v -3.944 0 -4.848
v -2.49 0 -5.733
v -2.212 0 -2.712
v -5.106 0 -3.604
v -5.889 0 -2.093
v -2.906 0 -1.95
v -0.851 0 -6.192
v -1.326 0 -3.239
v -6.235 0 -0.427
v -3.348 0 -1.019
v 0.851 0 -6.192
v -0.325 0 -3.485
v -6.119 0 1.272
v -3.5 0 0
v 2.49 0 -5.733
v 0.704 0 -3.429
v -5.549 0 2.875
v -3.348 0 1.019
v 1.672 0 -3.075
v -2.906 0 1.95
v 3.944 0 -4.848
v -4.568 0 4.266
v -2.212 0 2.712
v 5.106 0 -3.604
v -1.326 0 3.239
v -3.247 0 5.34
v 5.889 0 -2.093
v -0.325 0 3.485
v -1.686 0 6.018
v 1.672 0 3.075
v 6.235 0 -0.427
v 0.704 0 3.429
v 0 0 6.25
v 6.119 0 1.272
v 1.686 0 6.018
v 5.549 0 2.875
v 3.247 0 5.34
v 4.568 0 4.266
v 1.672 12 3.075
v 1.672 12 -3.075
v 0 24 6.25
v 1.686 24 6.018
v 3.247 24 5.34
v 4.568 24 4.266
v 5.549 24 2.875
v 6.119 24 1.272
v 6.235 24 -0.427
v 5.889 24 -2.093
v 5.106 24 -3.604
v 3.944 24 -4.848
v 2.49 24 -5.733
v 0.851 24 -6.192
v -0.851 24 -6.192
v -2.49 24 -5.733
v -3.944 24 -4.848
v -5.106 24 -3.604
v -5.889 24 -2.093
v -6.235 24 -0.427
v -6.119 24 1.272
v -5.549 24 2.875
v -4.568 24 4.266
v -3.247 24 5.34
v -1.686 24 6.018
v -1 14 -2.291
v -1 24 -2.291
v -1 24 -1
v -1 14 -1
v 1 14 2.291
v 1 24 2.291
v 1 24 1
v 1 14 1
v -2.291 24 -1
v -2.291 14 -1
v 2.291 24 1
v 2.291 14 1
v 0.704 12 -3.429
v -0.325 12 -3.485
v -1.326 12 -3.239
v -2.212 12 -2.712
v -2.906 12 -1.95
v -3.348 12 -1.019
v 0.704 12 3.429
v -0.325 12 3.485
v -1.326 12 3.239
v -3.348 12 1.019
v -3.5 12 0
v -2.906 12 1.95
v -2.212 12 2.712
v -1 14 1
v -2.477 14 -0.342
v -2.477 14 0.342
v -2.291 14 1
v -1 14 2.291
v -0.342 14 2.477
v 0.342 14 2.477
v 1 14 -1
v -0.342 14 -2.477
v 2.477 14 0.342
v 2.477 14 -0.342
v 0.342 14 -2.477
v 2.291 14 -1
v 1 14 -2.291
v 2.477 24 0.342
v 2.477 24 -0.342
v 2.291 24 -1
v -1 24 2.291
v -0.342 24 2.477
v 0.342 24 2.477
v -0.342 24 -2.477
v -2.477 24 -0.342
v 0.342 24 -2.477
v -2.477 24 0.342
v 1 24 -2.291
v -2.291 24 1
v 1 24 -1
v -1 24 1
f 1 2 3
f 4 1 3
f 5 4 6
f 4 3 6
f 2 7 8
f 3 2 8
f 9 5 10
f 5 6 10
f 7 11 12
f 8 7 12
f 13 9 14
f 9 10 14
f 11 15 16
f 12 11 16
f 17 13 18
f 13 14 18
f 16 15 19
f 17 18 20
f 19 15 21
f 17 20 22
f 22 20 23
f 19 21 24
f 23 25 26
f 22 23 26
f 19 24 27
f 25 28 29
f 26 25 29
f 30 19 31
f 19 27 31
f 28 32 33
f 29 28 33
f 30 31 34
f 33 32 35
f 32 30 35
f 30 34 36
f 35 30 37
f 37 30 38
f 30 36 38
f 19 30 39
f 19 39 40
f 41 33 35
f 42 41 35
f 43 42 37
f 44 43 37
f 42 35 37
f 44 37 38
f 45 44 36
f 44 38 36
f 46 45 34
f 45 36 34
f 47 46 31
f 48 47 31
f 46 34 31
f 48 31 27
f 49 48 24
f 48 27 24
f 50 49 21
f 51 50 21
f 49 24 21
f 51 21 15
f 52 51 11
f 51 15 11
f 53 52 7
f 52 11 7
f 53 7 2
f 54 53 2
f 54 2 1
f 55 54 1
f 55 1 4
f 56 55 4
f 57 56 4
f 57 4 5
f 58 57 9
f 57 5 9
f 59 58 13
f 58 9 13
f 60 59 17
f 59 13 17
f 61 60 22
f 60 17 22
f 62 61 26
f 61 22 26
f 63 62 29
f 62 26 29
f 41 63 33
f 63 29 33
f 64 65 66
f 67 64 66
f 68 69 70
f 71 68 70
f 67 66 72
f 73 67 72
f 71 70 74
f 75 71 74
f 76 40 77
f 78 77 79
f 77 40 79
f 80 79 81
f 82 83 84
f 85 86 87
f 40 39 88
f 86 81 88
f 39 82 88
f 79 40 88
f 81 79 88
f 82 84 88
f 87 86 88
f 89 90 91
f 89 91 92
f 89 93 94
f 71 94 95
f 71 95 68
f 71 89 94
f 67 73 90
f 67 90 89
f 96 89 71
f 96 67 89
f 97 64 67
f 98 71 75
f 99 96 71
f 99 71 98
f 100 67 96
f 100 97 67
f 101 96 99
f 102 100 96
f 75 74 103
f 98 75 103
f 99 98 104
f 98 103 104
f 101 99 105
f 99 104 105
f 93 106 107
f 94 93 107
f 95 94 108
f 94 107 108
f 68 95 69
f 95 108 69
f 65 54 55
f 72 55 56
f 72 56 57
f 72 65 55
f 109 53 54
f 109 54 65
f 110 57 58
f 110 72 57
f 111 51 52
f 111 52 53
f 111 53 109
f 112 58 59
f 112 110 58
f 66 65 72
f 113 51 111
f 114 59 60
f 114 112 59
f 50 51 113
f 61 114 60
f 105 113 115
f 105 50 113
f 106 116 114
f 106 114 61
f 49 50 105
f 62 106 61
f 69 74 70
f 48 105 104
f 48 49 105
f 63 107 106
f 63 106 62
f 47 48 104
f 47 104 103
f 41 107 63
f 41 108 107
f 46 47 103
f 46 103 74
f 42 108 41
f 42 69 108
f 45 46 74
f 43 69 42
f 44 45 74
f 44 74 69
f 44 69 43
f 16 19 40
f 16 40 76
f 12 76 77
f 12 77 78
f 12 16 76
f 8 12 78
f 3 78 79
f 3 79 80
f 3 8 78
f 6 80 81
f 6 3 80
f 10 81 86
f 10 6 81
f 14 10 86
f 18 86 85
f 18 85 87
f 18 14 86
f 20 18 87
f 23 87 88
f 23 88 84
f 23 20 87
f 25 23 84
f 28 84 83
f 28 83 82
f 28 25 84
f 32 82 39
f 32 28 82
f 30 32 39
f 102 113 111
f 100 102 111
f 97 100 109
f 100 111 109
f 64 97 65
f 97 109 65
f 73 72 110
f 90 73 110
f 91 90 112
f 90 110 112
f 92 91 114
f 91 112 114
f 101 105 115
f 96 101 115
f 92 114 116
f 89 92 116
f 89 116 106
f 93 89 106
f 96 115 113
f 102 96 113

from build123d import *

# Parameters (mm, degrees)
ESQUISSE1_R             = 6.25
BOSS_EXTRU_1_DEPTH      = 24
ENL_V_MAT_EXTRU_1_DEPTH = 12
ESQUISSE5_W             = 2
ESQUISSE5_H             = 2
ENL_V_MAT_EXTRU_3_DEPTH = 10


with BuildPart() as part:
    # Esquisse1 → Boss.-Extru.1 (new body)
    with BuildSketch(Plane(origin=(0, 0, 0), x_dir=(1, 0, 0), z_dir=(0, 1, 0))):
        with Locations(Location((0, 0, 0), (0, 0, 270))):
            Circle(ESQUISSE1_R)
    extrude(amount=BOSS_EXTRU_1_DEPTH)

    # Esquisse4 → Enlèv. mat.-Extru.1 (cut)
    with BuildSketch(Plane.XZ):
        with BuildLine():
            Line((1.671638418, 3.075), (1.671638418, -3.075))
            ThreePointArc((1.671638418, -3.075), (-3.5, 0), (1.671638418, 3.075))
        make_face()
    extrude(amount=-ENL_V_MAT_EXTRU_1_DEPTH, mode=Mode.SUBTRACT)

    # Esquisse5 → Enlèv. mat.-Extru.3 (cut)
    with BuildSketch(Plane(origin=(0, 24, 0), x_dir=(1, 0, 0), z_dir=(0, 1, 0))):
        with BuildLine():
            Line((-1, 1), (1, 1))
            Line((1, 1), (1, 2.291287847))
            ThreePointArc((1, 2.291287847), (0, 2.5), (-1, 2.291287847))
            Line((-1, 2.291287847), (-1, 1))
        make_face()
        with BuildLine():
            Line((1, 1), (1, -1))
            Line((1, -1), (2.291287847, -1))
            ThreePointArc((2.291287847, -1), (2.5, 0), (2.291287847, 1))
            Line((2.291287847, 1), (1, 1))
        make_face()
        with BuildLine():
            Line((-2.291287847, -1), (-1, -1))
            Line((-1, -1), (-1, 1))
            Line((-1, 1), (-2.291287847, 1))
            ThreePointArc((-2.291287847, 1), (-2.5, 0), (-2.291287847, -1))
        make_face()
        with BuildLine():
            ThreePointArc((-1, -2.291287847), (0, -2.5), (1, -2.291287847))
            Line((1, -2.291287847), (1, -1))
            Line((1, -1), (-1, -1))
            Line((-1, -1), (-1, -2.291287847))
        make_face()
        Rectangle(ESQUISSE5_W, ESQUISSE5_H)
    extrude(amount=-ENL_V_MAT_EXTRU_3_DEPTH, mode=Mode.SUBTRACT)


solid = part.part
